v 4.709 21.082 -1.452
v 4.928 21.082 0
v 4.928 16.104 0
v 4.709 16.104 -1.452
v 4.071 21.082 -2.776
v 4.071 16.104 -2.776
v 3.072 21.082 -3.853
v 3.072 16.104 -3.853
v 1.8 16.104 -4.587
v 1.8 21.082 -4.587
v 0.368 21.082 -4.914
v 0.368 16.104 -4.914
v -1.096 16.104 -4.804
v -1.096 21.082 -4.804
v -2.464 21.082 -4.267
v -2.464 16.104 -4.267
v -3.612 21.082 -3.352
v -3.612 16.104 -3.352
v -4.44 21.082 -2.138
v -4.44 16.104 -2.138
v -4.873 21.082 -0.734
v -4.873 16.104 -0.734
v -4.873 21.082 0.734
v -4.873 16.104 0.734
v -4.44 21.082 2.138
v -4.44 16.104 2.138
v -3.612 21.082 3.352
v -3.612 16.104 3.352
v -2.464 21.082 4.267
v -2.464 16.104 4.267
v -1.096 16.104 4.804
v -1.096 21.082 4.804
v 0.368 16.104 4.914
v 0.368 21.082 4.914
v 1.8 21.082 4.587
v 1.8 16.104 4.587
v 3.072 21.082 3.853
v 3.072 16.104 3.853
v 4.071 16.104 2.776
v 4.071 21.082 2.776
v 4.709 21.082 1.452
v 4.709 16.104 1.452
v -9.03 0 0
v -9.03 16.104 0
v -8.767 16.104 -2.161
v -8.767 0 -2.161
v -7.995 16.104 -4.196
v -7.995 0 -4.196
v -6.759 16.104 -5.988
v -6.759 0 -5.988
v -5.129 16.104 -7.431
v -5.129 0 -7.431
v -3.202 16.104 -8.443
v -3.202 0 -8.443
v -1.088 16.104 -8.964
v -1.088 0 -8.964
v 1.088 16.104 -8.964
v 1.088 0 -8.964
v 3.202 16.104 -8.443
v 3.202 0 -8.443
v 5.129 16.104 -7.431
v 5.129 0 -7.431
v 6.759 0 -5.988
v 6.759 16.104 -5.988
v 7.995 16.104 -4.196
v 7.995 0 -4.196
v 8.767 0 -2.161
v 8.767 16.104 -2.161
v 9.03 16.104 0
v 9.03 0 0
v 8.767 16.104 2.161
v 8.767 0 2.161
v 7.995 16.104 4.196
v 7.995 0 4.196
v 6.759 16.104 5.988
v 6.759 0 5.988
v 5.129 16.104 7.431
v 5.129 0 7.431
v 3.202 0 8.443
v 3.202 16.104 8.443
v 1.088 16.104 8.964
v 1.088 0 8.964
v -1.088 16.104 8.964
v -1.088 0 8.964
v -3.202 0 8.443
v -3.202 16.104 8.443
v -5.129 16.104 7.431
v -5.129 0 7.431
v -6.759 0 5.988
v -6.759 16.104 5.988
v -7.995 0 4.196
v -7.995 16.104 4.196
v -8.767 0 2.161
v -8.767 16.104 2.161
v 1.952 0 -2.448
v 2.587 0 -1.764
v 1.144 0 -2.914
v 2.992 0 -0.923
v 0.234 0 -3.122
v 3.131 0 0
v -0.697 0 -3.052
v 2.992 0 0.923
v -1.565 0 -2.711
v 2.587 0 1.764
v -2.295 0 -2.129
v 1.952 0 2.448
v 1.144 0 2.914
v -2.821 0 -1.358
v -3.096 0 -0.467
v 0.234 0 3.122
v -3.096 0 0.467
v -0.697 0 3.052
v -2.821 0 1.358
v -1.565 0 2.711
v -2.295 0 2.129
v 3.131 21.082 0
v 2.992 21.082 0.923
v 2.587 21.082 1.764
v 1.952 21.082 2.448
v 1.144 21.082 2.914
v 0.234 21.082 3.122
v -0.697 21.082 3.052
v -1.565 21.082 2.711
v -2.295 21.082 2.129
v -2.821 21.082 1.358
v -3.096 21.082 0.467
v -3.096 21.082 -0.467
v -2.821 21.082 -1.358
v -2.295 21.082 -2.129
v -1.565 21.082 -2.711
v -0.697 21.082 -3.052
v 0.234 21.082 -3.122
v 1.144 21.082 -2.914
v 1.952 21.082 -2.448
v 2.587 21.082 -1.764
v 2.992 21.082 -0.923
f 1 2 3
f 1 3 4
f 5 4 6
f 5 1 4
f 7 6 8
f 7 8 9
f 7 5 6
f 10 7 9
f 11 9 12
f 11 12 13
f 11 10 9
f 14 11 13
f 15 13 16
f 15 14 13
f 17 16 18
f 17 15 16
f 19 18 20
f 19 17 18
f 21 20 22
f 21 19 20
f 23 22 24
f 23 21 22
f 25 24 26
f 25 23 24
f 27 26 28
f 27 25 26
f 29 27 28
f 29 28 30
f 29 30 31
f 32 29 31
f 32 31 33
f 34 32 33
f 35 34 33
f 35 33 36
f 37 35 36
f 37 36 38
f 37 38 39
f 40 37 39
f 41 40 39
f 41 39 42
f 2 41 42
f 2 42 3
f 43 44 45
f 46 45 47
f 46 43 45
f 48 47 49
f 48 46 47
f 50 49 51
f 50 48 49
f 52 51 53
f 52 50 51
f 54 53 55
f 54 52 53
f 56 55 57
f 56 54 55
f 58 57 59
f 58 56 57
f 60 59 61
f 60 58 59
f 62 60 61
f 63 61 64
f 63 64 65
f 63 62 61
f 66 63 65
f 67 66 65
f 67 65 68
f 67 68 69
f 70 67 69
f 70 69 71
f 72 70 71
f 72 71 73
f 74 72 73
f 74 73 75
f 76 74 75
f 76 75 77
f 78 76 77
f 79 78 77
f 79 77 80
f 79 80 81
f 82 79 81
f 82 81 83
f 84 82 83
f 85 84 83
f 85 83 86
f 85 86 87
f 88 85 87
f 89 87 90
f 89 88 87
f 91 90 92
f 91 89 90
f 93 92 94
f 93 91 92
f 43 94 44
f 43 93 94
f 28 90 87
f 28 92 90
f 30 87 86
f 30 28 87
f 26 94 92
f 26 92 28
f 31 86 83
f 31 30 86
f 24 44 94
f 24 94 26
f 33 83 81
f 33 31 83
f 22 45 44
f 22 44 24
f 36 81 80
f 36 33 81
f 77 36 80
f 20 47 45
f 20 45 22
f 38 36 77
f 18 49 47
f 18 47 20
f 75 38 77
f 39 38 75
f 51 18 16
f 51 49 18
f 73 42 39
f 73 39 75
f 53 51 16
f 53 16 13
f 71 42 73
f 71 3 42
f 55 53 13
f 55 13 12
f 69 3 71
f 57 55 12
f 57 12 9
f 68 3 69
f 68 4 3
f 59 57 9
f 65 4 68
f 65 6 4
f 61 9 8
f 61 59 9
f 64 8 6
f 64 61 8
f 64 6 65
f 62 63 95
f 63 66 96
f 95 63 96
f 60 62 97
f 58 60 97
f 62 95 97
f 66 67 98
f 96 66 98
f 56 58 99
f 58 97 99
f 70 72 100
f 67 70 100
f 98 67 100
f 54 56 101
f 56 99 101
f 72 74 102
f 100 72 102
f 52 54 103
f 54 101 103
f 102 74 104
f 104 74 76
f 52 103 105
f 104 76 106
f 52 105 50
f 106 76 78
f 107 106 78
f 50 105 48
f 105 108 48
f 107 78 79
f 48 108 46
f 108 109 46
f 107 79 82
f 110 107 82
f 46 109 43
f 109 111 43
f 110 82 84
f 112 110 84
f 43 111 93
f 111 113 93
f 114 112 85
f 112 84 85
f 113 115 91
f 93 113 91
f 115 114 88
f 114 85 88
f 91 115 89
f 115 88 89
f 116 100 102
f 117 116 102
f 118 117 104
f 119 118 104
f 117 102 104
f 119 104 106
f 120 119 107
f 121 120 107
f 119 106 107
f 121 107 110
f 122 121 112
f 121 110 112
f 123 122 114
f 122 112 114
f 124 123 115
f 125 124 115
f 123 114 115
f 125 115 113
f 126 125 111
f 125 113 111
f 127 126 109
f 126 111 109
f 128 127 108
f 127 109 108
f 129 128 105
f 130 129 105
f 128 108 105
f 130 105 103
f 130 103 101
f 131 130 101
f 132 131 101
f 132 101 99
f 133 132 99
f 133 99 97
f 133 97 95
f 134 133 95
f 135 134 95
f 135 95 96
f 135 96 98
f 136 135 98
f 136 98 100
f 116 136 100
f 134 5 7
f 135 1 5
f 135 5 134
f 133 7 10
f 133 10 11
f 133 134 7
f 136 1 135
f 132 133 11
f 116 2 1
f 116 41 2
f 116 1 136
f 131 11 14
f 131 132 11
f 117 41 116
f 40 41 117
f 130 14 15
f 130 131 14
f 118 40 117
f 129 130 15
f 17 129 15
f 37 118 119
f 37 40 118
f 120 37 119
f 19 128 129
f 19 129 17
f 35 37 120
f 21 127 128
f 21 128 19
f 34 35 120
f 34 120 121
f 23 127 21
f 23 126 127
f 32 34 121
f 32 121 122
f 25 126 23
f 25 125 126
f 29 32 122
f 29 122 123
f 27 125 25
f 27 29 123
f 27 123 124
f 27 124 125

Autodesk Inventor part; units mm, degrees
ref_plane "YZ Plane" through (0, 0, 0) normal (1, 0, 0) x (0, 1, 0)
ref_plane "XZ Plane" through (0, 0, 0) normal (0, 1, 0) x (-1, 0, 0)
ref_plane "XY Plane" through (0, 0, 0) normal (0, 0, 1) x (1, 0, 0)
sketch "Sketch1" plane through (0, 0, 0) normal (0, 1, 0) x (-1, 0, 0)
  circle A0 centre (0, 0) radius 9.0297
  dimension "d0" = 18.0594
extrude "Extrusion1" add sketch "Sketch1" along normal blind 21.082
sketch "Sketch2" plane through (0, 21.082, 0) normal (0, 1, 0) x (1, 0, 0)
  circle A0 centre (0, 0) radius 4.9276
  circle A1 centre (0, 0) radius 9.0297
  dimension "d3" = 9.8552
  dimension "d4" = 18.0594
extrude "Extrusion2" cut sketch "Sketch2" against normal blind 4.9784
sketch "Sketch3" plane through (0, 0, 0) normal (0, -1, 0) x (1, 0, 0)
  circle A0 centre (0, 0) radius 3.1306
  dimension "d7" = 6.2611
extrude "Extrusion3" cut sketch "Sketch3" against normal blind 203.2
properties part number "Wire fitting End"
